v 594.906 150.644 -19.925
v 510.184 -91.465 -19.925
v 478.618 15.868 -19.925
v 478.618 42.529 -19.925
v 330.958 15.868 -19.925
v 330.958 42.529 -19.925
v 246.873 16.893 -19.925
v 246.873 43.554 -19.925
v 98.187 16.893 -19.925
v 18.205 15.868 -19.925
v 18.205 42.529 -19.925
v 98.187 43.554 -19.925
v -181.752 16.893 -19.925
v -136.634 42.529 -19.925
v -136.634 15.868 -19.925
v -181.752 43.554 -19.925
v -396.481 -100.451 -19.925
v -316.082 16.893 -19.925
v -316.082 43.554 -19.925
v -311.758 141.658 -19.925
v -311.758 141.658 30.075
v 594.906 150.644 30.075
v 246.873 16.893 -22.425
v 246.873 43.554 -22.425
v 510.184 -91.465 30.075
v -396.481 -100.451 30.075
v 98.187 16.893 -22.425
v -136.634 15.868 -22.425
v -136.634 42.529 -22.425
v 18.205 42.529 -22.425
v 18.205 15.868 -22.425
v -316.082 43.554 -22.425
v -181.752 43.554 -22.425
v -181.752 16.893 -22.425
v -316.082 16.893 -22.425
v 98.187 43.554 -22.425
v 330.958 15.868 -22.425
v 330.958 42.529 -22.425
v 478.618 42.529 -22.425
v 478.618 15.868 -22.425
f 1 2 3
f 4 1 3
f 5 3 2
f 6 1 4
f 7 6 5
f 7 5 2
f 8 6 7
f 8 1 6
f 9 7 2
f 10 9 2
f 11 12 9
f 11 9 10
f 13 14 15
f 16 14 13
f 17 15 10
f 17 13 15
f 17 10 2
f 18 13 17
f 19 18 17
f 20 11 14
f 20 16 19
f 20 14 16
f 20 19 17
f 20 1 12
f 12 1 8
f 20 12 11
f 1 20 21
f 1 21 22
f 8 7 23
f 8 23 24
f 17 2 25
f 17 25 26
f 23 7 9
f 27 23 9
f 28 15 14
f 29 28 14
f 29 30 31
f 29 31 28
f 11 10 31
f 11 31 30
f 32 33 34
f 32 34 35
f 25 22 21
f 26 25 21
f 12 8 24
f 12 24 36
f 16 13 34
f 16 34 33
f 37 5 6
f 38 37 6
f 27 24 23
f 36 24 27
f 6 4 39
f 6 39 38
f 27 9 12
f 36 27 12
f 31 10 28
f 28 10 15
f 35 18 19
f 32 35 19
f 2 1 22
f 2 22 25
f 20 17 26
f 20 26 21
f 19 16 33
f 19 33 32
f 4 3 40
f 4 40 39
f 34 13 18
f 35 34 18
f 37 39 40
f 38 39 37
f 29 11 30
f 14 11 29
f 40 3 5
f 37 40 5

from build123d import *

# Parameters (mm, degrees)
BOSS_EXTRUDE2_DEPTH = 10
SKETCH3_W           = 29.532068245
SKETCH3_H           = 5.332178988
SKETCH3_W_2         = 29.737152051
SKETCH3_W_3         = 30.967654895
SKETCH3_W_4         = 26.86597875
BOSS_EXTRUDE3_DEPTH = 0.5
SCALE1_SCALE        = 5


with BuildPart() as part:
    # Sketch2 → Boss-Extrude2 (new body)
    with BuildSketch(Plane.XY):
        Polygon((0, 0), (16.944463815, 48.421938639), (198.277369744, 50.219093306), (181.332905929, 1.797154667), align=None)
    extrude(amount=BOSS_EXTRUDE2_DEPTH)

    # Sketch3 → Boss-Extrude3 (add)
    with BuildSketch(Plane(origin=(0, 0, 0), x_dir=(-1, 0, 0), z_dir=(0, 0, -1))):
        with Locations((-160.253659434, 25.929881882)):
            Rectangle(SKETCH3_W, SKETCH3_H)
        with Locations((-113.802177091, 26.134965689)):
            Rectangle(SKETCH3_W_2, SKETCH3_H)
        with Locations((-67.453236652, 25.929881882)):
            Rectangle(SKETCH3_W_3, SKETCH3_H)
        with Locations((-29.51273231, 26.134965689)):
            Rectangle(SKETCH3_W_4, SKETCH3_H)
    extrude(amount=BOSS_EXTRUDE3_DEPTH)


with BuildPart() as part_1:
    # Scale1: scaled about (99.120137523, 25.112815696, 4.981334283)
    add(part.part.scale(SCALE1_SCALE).moved(Location((-396.480550092, -100.451262784, -19.925337132))))


solid = part_1.part
